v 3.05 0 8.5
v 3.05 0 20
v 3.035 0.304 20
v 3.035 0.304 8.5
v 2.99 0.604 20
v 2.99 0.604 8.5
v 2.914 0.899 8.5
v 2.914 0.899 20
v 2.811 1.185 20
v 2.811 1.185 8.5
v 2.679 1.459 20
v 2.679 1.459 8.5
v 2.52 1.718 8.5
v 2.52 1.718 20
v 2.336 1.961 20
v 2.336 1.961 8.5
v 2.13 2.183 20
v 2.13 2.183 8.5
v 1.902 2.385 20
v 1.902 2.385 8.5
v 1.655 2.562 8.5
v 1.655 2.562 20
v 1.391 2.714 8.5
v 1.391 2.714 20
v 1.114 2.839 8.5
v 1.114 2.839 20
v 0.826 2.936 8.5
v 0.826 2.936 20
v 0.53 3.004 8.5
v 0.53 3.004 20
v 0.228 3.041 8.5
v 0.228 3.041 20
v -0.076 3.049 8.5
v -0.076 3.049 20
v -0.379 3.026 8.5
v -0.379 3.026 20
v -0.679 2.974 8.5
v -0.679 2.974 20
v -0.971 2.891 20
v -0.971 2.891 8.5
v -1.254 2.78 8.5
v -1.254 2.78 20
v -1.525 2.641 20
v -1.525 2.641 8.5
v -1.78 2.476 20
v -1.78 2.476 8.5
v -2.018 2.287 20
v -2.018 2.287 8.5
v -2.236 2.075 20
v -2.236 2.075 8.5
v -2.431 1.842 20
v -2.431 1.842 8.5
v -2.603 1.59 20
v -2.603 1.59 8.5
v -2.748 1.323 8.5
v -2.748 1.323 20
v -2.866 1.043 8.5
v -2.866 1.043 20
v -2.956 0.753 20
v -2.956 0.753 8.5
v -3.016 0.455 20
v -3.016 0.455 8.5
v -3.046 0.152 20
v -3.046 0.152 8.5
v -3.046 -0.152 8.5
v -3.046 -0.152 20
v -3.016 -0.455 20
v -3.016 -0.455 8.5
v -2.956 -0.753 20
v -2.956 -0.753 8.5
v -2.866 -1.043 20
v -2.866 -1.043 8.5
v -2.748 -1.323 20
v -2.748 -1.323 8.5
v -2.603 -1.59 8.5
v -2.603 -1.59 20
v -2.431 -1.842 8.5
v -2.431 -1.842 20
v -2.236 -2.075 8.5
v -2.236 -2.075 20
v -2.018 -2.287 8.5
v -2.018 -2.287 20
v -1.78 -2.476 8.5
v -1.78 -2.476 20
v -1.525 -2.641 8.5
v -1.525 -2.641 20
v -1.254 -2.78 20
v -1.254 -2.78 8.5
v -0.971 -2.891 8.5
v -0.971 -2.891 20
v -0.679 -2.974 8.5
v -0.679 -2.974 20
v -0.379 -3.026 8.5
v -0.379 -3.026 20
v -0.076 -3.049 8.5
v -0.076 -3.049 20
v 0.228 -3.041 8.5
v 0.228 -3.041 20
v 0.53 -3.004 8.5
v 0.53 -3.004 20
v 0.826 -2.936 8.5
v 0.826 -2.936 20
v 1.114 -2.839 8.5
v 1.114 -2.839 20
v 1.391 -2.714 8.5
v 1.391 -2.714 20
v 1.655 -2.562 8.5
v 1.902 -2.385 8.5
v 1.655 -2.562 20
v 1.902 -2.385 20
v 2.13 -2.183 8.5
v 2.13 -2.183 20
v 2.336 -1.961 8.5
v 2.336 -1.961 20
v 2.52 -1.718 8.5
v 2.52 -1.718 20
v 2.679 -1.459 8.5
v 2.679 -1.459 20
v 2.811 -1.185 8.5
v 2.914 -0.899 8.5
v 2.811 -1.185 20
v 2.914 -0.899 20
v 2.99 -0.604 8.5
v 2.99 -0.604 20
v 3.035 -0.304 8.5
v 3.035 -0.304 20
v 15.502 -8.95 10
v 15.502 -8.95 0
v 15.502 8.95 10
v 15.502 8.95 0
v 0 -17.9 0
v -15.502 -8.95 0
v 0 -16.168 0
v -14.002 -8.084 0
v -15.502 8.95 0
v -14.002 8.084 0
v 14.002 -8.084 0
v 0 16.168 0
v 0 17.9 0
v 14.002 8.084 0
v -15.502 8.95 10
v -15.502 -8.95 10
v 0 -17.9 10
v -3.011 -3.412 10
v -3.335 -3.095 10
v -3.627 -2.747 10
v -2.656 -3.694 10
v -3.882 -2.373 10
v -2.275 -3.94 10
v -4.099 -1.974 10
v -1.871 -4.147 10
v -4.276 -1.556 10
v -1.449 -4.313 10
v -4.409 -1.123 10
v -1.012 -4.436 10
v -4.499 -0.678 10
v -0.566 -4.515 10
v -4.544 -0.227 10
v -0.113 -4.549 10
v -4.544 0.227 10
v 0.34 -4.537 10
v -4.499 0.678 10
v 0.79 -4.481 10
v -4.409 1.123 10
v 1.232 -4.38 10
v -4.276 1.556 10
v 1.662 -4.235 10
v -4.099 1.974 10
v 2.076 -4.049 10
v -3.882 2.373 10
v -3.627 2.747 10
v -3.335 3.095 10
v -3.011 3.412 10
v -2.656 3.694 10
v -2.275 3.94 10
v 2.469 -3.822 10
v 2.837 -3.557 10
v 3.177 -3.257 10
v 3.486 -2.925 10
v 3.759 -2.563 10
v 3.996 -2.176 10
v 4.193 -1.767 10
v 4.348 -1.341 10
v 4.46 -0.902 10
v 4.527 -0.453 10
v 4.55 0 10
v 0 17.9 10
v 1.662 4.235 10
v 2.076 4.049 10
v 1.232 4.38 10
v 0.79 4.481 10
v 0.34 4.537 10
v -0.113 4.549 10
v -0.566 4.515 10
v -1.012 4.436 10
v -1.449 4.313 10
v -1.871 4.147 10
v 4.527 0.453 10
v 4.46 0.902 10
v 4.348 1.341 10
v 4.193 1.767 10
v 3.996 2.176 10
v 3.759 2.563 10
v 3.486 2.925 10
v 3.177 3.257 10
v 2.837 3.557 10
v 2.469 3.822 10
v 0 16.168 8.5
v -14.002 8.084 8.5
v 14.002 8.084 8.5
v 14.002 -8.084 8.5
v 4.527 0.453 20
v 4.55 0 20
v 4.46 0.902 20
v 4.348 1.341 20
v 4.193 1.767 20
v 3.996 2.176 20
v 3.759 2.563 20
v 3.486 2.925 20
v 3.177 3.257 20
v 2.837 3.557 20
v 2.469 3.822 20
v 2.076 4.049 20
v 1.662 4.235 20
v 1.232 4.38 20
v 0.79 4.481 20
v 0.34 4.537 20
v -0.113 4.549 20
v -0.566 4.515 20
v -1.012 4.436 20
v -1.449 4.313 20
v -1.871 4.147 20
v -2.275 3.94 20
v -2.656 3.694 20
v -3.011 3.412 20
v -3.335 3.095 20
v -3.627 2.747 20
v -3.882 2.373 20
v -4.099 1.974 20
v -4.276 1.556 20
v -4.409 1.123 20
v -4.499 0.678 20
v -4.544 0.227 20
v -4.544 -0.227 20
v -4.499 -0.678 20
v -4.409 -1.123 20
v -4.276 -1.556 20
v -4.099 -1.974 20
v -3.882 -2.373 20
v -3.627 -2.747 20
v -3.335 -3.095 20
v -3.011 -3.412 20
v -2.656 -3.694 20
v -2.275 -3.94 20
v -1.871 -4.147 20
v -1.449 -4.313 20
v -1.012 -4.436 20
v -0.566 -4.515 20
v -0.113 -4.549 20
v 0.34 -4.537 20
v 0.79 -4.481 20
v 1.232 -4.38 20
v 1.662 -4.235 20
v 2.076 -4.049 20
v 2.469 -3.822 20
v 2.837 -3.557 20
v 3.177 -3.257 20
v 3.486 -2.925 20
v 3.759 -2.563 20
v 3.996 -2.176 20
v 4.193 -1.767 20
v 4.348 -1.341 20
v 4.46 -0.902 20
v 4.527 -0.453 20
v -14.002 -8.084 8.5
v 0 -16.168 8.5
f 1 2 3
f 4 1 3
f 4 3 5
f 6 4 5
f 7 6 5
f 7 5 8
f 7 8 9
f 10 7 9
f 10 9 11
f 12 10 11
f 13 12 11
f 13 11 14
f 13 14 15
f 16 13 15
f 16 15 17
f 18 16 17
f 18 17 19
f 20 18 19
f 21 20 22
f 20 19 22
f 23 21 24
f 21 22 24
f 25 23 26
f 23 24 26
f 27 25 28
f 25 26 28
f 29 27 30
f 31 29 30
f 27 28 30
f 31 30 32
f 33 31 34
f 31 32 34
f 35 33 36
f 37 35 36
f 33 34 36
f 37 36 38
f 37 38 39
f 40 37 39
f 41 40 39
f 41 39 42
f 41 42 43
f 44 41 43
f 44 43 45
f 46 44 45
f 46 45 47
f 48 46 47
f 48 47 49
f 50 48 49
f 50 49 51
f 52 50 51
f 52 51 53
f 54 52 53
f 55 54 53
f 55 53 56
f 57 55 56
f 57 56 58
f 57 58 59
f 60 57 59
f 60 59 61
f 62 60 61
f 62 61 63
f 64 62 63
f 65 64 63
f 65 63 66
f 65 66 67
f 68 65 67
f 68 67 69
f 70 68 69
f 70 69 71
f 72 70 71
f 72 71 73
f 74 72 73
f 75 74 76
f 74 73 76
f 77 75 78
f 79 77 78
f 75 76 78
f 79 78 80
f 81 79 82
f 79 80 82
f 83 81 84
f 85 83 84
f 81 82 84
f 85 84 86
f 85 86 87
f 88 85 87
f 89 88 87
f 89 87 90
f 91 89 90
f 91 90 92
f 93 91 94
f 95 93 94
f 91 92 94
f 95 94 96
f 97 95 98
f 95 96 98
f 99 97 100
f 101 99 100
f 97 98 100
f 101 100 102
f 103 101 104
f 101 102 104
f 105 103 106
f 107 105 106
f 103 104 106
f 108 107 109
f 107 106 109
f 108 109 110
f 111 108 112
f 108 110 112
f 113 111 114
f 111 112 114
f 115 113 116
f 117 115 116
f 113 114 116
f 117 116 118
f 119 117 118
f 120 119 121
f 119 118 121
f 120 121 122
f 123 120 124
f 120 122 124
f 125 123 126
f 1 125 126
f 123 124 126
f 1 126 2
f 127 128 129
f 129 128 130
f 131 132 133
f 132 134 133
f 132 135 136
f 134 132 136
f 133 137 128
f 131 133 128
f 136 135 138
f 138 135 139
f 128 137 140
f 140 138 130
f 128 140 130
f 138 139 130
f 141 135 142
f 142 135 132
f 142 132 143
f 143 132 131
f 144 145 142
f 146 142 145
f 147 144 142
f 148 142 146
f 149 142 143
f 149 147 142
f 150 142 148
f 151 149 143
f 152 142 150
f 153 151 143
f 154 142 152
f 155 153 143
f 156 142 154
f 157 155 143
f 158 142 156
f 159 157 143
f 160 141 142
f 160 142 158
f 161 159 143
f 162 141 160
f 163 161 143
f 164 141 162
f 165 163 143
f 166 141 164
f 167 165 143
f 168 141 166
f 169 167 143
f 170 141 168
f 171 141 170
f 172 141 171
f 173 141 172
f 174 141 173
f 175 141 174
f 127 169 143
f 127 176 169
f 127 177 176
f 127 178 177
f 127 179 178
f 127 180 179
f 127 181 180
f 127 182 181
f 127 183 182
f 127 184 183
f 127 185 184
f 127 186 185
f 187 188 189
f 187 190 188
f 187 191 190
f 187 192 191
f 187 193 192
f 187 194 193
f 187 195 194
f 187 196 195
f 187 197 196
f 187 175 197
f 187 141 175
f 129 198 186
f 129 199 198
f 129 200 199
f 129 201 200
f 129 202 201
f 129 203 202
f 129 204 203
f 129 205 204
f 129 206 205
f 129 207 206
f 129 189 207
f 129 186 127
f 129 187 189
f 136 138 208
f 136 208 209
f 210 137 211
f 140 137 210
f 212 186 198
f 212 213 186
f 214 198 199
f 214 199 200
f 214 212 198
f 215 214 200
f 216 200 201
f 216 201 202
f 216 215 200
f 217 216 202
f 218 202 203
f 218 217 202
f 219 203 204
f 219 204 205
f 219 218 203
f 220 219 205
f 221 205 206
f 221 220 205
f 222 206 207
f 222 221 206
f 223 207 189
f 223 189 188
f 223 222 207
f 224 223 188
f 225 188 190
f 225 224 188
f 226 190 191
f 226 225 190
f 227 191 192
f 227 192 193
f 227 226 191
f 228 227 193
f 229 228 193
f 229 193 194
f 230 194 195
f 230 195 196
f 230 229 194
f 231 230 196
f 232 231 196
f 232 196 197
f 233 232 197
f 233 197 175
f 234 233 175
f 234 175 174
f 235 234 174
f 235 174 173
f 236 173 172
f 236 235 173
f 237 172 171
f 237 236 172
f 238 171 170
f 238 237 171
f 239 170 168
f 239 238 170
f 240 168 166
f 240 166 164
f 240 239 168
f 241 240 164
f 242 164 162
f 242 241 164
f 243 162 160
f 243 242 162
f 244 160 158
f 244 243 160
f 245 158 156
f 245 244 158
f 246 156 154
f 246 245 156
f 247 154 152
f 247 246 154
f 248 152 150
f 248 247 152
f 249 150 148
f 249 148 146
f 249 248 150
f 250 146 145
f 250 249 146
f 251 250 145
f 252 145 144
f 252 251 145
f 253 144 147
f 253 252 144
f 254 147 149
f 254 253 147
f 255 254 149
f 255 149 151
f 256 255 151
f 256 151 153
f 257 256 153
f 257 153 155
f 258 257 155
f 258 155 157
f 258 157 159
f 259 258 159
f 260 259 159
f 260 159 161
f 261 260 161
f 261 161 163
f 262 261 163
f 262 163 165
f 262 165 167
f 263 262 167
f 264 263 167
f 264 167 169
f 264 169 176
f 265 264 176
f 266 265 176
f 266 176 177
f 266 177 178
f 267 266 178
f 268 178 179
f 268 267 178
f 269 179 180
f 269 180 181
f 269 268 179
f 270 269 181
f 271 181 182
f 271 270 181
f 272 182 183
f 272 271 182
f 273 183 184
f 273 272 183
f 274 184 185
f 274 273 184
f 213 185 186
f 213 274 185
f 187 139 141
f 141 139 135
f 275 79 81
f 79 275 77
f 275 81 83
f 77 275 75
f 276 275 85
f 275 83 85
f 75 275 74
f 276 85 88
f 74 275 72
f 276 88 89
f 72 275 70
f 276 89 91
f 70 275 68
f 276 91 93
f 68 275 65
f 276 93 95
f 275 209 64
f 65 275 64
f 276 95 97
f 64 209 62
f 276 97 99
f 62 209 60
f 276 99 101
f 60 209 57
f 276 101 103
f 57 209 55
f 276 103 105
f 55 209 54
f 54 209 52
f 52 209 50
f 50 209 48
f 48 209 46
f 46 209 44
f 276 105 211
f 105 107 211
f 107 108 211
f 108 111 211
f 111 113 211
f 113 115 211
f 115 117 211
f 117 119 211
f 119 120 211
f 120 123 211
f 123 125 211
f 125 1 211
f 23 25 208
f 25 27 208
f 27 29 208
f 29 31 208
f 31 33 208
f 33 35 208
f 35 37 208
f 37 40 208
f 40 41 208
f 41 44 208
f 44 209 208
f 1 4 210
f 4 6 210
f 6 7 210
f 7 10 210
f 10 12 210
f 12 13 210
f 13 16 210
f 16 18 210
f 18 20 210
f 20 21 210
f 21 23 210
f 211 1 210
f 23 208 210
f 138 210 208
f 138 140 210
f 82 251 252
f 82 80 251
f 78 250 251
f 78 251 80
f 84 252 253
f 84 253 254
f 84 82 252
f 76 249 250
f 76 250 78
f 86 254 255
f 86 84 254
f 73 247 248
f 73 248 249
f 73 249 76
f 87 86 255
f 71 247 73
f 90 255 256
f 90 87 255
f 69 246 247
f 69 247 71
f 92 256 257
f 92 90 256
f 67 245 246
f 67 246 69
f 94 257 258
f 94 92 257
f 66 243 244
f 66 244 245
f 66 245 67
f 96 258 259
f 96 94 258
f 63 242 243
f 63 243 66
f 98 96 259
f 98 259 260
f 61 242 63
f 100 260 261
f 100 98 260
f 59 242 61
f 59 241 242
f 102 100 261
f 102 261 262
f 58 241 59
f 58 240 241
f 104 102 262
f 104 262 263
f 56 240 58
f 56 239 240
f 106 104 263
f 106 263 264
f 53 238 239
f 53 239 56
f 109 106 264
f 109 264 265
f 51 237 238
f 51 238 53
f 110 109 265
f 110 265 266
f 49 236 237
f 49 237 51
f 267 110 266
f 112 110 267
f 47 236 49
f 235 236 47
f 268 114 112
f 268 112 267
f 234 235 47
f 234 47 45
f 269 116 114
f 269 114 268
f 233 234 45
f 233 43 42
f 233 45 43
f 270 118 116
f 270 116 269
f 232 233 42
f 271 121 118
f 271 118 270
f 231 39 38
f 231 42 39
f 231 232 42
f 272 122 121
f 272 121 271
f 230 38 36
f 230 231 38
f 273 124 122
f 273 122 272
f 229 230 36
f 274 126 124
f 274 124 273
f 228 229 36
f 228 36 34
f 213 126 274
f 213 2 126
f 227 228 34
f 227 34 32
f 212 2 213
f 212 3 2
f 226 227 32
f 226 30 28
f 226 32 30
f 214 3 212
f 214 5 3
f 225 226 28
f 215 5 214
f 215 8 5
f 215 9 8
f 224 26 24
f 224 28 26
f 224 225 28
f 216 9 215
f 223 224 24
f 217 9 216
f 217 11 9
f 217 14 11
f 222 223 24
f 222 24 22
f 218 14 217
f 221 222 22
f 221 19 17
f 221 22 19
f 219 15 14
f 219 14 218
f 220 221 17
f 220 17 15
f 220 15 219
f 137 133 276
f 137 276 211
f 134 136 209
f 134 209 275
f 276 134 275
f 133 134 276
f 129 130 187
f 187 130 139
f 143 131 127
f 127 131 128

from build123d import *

# Parameters (mm, degrees)
F1_DEPTH = 10
F2_R     = 4.55
F3_DEPTH = 10
F4_T     = -1.5


with BuildPart() as f1:
    # F0 (on Top) → F1 (new body)
    with BuildSketch(Plane.XY):
        Polygon((-15.5018547277, -8.95), (0, -17.9), (15.5018547277, -8.95), (15.5018547277, 8.95), (0, 17.9), (-15.5018547277, 8.95), align=None)
    extrude(amount=F1_DEPTH)

    # F2 (on face) → F3 (join, symmetric)
    with BuildSketch(Plane.XY.offset(10)):
        Circle(F2_R)
    extrude(amount=F3_DEPTH, both=True)

    # F4
    f4_openings = [f1.faces().sort_by_distance(p)[0] for p in [
        (0, 0, 0),
        (0, 0, 20),
    ]]
    offset(amount=F4_T, openings=f4_openings, kind=Kind.INTERSECTION)


solid = f1.part
